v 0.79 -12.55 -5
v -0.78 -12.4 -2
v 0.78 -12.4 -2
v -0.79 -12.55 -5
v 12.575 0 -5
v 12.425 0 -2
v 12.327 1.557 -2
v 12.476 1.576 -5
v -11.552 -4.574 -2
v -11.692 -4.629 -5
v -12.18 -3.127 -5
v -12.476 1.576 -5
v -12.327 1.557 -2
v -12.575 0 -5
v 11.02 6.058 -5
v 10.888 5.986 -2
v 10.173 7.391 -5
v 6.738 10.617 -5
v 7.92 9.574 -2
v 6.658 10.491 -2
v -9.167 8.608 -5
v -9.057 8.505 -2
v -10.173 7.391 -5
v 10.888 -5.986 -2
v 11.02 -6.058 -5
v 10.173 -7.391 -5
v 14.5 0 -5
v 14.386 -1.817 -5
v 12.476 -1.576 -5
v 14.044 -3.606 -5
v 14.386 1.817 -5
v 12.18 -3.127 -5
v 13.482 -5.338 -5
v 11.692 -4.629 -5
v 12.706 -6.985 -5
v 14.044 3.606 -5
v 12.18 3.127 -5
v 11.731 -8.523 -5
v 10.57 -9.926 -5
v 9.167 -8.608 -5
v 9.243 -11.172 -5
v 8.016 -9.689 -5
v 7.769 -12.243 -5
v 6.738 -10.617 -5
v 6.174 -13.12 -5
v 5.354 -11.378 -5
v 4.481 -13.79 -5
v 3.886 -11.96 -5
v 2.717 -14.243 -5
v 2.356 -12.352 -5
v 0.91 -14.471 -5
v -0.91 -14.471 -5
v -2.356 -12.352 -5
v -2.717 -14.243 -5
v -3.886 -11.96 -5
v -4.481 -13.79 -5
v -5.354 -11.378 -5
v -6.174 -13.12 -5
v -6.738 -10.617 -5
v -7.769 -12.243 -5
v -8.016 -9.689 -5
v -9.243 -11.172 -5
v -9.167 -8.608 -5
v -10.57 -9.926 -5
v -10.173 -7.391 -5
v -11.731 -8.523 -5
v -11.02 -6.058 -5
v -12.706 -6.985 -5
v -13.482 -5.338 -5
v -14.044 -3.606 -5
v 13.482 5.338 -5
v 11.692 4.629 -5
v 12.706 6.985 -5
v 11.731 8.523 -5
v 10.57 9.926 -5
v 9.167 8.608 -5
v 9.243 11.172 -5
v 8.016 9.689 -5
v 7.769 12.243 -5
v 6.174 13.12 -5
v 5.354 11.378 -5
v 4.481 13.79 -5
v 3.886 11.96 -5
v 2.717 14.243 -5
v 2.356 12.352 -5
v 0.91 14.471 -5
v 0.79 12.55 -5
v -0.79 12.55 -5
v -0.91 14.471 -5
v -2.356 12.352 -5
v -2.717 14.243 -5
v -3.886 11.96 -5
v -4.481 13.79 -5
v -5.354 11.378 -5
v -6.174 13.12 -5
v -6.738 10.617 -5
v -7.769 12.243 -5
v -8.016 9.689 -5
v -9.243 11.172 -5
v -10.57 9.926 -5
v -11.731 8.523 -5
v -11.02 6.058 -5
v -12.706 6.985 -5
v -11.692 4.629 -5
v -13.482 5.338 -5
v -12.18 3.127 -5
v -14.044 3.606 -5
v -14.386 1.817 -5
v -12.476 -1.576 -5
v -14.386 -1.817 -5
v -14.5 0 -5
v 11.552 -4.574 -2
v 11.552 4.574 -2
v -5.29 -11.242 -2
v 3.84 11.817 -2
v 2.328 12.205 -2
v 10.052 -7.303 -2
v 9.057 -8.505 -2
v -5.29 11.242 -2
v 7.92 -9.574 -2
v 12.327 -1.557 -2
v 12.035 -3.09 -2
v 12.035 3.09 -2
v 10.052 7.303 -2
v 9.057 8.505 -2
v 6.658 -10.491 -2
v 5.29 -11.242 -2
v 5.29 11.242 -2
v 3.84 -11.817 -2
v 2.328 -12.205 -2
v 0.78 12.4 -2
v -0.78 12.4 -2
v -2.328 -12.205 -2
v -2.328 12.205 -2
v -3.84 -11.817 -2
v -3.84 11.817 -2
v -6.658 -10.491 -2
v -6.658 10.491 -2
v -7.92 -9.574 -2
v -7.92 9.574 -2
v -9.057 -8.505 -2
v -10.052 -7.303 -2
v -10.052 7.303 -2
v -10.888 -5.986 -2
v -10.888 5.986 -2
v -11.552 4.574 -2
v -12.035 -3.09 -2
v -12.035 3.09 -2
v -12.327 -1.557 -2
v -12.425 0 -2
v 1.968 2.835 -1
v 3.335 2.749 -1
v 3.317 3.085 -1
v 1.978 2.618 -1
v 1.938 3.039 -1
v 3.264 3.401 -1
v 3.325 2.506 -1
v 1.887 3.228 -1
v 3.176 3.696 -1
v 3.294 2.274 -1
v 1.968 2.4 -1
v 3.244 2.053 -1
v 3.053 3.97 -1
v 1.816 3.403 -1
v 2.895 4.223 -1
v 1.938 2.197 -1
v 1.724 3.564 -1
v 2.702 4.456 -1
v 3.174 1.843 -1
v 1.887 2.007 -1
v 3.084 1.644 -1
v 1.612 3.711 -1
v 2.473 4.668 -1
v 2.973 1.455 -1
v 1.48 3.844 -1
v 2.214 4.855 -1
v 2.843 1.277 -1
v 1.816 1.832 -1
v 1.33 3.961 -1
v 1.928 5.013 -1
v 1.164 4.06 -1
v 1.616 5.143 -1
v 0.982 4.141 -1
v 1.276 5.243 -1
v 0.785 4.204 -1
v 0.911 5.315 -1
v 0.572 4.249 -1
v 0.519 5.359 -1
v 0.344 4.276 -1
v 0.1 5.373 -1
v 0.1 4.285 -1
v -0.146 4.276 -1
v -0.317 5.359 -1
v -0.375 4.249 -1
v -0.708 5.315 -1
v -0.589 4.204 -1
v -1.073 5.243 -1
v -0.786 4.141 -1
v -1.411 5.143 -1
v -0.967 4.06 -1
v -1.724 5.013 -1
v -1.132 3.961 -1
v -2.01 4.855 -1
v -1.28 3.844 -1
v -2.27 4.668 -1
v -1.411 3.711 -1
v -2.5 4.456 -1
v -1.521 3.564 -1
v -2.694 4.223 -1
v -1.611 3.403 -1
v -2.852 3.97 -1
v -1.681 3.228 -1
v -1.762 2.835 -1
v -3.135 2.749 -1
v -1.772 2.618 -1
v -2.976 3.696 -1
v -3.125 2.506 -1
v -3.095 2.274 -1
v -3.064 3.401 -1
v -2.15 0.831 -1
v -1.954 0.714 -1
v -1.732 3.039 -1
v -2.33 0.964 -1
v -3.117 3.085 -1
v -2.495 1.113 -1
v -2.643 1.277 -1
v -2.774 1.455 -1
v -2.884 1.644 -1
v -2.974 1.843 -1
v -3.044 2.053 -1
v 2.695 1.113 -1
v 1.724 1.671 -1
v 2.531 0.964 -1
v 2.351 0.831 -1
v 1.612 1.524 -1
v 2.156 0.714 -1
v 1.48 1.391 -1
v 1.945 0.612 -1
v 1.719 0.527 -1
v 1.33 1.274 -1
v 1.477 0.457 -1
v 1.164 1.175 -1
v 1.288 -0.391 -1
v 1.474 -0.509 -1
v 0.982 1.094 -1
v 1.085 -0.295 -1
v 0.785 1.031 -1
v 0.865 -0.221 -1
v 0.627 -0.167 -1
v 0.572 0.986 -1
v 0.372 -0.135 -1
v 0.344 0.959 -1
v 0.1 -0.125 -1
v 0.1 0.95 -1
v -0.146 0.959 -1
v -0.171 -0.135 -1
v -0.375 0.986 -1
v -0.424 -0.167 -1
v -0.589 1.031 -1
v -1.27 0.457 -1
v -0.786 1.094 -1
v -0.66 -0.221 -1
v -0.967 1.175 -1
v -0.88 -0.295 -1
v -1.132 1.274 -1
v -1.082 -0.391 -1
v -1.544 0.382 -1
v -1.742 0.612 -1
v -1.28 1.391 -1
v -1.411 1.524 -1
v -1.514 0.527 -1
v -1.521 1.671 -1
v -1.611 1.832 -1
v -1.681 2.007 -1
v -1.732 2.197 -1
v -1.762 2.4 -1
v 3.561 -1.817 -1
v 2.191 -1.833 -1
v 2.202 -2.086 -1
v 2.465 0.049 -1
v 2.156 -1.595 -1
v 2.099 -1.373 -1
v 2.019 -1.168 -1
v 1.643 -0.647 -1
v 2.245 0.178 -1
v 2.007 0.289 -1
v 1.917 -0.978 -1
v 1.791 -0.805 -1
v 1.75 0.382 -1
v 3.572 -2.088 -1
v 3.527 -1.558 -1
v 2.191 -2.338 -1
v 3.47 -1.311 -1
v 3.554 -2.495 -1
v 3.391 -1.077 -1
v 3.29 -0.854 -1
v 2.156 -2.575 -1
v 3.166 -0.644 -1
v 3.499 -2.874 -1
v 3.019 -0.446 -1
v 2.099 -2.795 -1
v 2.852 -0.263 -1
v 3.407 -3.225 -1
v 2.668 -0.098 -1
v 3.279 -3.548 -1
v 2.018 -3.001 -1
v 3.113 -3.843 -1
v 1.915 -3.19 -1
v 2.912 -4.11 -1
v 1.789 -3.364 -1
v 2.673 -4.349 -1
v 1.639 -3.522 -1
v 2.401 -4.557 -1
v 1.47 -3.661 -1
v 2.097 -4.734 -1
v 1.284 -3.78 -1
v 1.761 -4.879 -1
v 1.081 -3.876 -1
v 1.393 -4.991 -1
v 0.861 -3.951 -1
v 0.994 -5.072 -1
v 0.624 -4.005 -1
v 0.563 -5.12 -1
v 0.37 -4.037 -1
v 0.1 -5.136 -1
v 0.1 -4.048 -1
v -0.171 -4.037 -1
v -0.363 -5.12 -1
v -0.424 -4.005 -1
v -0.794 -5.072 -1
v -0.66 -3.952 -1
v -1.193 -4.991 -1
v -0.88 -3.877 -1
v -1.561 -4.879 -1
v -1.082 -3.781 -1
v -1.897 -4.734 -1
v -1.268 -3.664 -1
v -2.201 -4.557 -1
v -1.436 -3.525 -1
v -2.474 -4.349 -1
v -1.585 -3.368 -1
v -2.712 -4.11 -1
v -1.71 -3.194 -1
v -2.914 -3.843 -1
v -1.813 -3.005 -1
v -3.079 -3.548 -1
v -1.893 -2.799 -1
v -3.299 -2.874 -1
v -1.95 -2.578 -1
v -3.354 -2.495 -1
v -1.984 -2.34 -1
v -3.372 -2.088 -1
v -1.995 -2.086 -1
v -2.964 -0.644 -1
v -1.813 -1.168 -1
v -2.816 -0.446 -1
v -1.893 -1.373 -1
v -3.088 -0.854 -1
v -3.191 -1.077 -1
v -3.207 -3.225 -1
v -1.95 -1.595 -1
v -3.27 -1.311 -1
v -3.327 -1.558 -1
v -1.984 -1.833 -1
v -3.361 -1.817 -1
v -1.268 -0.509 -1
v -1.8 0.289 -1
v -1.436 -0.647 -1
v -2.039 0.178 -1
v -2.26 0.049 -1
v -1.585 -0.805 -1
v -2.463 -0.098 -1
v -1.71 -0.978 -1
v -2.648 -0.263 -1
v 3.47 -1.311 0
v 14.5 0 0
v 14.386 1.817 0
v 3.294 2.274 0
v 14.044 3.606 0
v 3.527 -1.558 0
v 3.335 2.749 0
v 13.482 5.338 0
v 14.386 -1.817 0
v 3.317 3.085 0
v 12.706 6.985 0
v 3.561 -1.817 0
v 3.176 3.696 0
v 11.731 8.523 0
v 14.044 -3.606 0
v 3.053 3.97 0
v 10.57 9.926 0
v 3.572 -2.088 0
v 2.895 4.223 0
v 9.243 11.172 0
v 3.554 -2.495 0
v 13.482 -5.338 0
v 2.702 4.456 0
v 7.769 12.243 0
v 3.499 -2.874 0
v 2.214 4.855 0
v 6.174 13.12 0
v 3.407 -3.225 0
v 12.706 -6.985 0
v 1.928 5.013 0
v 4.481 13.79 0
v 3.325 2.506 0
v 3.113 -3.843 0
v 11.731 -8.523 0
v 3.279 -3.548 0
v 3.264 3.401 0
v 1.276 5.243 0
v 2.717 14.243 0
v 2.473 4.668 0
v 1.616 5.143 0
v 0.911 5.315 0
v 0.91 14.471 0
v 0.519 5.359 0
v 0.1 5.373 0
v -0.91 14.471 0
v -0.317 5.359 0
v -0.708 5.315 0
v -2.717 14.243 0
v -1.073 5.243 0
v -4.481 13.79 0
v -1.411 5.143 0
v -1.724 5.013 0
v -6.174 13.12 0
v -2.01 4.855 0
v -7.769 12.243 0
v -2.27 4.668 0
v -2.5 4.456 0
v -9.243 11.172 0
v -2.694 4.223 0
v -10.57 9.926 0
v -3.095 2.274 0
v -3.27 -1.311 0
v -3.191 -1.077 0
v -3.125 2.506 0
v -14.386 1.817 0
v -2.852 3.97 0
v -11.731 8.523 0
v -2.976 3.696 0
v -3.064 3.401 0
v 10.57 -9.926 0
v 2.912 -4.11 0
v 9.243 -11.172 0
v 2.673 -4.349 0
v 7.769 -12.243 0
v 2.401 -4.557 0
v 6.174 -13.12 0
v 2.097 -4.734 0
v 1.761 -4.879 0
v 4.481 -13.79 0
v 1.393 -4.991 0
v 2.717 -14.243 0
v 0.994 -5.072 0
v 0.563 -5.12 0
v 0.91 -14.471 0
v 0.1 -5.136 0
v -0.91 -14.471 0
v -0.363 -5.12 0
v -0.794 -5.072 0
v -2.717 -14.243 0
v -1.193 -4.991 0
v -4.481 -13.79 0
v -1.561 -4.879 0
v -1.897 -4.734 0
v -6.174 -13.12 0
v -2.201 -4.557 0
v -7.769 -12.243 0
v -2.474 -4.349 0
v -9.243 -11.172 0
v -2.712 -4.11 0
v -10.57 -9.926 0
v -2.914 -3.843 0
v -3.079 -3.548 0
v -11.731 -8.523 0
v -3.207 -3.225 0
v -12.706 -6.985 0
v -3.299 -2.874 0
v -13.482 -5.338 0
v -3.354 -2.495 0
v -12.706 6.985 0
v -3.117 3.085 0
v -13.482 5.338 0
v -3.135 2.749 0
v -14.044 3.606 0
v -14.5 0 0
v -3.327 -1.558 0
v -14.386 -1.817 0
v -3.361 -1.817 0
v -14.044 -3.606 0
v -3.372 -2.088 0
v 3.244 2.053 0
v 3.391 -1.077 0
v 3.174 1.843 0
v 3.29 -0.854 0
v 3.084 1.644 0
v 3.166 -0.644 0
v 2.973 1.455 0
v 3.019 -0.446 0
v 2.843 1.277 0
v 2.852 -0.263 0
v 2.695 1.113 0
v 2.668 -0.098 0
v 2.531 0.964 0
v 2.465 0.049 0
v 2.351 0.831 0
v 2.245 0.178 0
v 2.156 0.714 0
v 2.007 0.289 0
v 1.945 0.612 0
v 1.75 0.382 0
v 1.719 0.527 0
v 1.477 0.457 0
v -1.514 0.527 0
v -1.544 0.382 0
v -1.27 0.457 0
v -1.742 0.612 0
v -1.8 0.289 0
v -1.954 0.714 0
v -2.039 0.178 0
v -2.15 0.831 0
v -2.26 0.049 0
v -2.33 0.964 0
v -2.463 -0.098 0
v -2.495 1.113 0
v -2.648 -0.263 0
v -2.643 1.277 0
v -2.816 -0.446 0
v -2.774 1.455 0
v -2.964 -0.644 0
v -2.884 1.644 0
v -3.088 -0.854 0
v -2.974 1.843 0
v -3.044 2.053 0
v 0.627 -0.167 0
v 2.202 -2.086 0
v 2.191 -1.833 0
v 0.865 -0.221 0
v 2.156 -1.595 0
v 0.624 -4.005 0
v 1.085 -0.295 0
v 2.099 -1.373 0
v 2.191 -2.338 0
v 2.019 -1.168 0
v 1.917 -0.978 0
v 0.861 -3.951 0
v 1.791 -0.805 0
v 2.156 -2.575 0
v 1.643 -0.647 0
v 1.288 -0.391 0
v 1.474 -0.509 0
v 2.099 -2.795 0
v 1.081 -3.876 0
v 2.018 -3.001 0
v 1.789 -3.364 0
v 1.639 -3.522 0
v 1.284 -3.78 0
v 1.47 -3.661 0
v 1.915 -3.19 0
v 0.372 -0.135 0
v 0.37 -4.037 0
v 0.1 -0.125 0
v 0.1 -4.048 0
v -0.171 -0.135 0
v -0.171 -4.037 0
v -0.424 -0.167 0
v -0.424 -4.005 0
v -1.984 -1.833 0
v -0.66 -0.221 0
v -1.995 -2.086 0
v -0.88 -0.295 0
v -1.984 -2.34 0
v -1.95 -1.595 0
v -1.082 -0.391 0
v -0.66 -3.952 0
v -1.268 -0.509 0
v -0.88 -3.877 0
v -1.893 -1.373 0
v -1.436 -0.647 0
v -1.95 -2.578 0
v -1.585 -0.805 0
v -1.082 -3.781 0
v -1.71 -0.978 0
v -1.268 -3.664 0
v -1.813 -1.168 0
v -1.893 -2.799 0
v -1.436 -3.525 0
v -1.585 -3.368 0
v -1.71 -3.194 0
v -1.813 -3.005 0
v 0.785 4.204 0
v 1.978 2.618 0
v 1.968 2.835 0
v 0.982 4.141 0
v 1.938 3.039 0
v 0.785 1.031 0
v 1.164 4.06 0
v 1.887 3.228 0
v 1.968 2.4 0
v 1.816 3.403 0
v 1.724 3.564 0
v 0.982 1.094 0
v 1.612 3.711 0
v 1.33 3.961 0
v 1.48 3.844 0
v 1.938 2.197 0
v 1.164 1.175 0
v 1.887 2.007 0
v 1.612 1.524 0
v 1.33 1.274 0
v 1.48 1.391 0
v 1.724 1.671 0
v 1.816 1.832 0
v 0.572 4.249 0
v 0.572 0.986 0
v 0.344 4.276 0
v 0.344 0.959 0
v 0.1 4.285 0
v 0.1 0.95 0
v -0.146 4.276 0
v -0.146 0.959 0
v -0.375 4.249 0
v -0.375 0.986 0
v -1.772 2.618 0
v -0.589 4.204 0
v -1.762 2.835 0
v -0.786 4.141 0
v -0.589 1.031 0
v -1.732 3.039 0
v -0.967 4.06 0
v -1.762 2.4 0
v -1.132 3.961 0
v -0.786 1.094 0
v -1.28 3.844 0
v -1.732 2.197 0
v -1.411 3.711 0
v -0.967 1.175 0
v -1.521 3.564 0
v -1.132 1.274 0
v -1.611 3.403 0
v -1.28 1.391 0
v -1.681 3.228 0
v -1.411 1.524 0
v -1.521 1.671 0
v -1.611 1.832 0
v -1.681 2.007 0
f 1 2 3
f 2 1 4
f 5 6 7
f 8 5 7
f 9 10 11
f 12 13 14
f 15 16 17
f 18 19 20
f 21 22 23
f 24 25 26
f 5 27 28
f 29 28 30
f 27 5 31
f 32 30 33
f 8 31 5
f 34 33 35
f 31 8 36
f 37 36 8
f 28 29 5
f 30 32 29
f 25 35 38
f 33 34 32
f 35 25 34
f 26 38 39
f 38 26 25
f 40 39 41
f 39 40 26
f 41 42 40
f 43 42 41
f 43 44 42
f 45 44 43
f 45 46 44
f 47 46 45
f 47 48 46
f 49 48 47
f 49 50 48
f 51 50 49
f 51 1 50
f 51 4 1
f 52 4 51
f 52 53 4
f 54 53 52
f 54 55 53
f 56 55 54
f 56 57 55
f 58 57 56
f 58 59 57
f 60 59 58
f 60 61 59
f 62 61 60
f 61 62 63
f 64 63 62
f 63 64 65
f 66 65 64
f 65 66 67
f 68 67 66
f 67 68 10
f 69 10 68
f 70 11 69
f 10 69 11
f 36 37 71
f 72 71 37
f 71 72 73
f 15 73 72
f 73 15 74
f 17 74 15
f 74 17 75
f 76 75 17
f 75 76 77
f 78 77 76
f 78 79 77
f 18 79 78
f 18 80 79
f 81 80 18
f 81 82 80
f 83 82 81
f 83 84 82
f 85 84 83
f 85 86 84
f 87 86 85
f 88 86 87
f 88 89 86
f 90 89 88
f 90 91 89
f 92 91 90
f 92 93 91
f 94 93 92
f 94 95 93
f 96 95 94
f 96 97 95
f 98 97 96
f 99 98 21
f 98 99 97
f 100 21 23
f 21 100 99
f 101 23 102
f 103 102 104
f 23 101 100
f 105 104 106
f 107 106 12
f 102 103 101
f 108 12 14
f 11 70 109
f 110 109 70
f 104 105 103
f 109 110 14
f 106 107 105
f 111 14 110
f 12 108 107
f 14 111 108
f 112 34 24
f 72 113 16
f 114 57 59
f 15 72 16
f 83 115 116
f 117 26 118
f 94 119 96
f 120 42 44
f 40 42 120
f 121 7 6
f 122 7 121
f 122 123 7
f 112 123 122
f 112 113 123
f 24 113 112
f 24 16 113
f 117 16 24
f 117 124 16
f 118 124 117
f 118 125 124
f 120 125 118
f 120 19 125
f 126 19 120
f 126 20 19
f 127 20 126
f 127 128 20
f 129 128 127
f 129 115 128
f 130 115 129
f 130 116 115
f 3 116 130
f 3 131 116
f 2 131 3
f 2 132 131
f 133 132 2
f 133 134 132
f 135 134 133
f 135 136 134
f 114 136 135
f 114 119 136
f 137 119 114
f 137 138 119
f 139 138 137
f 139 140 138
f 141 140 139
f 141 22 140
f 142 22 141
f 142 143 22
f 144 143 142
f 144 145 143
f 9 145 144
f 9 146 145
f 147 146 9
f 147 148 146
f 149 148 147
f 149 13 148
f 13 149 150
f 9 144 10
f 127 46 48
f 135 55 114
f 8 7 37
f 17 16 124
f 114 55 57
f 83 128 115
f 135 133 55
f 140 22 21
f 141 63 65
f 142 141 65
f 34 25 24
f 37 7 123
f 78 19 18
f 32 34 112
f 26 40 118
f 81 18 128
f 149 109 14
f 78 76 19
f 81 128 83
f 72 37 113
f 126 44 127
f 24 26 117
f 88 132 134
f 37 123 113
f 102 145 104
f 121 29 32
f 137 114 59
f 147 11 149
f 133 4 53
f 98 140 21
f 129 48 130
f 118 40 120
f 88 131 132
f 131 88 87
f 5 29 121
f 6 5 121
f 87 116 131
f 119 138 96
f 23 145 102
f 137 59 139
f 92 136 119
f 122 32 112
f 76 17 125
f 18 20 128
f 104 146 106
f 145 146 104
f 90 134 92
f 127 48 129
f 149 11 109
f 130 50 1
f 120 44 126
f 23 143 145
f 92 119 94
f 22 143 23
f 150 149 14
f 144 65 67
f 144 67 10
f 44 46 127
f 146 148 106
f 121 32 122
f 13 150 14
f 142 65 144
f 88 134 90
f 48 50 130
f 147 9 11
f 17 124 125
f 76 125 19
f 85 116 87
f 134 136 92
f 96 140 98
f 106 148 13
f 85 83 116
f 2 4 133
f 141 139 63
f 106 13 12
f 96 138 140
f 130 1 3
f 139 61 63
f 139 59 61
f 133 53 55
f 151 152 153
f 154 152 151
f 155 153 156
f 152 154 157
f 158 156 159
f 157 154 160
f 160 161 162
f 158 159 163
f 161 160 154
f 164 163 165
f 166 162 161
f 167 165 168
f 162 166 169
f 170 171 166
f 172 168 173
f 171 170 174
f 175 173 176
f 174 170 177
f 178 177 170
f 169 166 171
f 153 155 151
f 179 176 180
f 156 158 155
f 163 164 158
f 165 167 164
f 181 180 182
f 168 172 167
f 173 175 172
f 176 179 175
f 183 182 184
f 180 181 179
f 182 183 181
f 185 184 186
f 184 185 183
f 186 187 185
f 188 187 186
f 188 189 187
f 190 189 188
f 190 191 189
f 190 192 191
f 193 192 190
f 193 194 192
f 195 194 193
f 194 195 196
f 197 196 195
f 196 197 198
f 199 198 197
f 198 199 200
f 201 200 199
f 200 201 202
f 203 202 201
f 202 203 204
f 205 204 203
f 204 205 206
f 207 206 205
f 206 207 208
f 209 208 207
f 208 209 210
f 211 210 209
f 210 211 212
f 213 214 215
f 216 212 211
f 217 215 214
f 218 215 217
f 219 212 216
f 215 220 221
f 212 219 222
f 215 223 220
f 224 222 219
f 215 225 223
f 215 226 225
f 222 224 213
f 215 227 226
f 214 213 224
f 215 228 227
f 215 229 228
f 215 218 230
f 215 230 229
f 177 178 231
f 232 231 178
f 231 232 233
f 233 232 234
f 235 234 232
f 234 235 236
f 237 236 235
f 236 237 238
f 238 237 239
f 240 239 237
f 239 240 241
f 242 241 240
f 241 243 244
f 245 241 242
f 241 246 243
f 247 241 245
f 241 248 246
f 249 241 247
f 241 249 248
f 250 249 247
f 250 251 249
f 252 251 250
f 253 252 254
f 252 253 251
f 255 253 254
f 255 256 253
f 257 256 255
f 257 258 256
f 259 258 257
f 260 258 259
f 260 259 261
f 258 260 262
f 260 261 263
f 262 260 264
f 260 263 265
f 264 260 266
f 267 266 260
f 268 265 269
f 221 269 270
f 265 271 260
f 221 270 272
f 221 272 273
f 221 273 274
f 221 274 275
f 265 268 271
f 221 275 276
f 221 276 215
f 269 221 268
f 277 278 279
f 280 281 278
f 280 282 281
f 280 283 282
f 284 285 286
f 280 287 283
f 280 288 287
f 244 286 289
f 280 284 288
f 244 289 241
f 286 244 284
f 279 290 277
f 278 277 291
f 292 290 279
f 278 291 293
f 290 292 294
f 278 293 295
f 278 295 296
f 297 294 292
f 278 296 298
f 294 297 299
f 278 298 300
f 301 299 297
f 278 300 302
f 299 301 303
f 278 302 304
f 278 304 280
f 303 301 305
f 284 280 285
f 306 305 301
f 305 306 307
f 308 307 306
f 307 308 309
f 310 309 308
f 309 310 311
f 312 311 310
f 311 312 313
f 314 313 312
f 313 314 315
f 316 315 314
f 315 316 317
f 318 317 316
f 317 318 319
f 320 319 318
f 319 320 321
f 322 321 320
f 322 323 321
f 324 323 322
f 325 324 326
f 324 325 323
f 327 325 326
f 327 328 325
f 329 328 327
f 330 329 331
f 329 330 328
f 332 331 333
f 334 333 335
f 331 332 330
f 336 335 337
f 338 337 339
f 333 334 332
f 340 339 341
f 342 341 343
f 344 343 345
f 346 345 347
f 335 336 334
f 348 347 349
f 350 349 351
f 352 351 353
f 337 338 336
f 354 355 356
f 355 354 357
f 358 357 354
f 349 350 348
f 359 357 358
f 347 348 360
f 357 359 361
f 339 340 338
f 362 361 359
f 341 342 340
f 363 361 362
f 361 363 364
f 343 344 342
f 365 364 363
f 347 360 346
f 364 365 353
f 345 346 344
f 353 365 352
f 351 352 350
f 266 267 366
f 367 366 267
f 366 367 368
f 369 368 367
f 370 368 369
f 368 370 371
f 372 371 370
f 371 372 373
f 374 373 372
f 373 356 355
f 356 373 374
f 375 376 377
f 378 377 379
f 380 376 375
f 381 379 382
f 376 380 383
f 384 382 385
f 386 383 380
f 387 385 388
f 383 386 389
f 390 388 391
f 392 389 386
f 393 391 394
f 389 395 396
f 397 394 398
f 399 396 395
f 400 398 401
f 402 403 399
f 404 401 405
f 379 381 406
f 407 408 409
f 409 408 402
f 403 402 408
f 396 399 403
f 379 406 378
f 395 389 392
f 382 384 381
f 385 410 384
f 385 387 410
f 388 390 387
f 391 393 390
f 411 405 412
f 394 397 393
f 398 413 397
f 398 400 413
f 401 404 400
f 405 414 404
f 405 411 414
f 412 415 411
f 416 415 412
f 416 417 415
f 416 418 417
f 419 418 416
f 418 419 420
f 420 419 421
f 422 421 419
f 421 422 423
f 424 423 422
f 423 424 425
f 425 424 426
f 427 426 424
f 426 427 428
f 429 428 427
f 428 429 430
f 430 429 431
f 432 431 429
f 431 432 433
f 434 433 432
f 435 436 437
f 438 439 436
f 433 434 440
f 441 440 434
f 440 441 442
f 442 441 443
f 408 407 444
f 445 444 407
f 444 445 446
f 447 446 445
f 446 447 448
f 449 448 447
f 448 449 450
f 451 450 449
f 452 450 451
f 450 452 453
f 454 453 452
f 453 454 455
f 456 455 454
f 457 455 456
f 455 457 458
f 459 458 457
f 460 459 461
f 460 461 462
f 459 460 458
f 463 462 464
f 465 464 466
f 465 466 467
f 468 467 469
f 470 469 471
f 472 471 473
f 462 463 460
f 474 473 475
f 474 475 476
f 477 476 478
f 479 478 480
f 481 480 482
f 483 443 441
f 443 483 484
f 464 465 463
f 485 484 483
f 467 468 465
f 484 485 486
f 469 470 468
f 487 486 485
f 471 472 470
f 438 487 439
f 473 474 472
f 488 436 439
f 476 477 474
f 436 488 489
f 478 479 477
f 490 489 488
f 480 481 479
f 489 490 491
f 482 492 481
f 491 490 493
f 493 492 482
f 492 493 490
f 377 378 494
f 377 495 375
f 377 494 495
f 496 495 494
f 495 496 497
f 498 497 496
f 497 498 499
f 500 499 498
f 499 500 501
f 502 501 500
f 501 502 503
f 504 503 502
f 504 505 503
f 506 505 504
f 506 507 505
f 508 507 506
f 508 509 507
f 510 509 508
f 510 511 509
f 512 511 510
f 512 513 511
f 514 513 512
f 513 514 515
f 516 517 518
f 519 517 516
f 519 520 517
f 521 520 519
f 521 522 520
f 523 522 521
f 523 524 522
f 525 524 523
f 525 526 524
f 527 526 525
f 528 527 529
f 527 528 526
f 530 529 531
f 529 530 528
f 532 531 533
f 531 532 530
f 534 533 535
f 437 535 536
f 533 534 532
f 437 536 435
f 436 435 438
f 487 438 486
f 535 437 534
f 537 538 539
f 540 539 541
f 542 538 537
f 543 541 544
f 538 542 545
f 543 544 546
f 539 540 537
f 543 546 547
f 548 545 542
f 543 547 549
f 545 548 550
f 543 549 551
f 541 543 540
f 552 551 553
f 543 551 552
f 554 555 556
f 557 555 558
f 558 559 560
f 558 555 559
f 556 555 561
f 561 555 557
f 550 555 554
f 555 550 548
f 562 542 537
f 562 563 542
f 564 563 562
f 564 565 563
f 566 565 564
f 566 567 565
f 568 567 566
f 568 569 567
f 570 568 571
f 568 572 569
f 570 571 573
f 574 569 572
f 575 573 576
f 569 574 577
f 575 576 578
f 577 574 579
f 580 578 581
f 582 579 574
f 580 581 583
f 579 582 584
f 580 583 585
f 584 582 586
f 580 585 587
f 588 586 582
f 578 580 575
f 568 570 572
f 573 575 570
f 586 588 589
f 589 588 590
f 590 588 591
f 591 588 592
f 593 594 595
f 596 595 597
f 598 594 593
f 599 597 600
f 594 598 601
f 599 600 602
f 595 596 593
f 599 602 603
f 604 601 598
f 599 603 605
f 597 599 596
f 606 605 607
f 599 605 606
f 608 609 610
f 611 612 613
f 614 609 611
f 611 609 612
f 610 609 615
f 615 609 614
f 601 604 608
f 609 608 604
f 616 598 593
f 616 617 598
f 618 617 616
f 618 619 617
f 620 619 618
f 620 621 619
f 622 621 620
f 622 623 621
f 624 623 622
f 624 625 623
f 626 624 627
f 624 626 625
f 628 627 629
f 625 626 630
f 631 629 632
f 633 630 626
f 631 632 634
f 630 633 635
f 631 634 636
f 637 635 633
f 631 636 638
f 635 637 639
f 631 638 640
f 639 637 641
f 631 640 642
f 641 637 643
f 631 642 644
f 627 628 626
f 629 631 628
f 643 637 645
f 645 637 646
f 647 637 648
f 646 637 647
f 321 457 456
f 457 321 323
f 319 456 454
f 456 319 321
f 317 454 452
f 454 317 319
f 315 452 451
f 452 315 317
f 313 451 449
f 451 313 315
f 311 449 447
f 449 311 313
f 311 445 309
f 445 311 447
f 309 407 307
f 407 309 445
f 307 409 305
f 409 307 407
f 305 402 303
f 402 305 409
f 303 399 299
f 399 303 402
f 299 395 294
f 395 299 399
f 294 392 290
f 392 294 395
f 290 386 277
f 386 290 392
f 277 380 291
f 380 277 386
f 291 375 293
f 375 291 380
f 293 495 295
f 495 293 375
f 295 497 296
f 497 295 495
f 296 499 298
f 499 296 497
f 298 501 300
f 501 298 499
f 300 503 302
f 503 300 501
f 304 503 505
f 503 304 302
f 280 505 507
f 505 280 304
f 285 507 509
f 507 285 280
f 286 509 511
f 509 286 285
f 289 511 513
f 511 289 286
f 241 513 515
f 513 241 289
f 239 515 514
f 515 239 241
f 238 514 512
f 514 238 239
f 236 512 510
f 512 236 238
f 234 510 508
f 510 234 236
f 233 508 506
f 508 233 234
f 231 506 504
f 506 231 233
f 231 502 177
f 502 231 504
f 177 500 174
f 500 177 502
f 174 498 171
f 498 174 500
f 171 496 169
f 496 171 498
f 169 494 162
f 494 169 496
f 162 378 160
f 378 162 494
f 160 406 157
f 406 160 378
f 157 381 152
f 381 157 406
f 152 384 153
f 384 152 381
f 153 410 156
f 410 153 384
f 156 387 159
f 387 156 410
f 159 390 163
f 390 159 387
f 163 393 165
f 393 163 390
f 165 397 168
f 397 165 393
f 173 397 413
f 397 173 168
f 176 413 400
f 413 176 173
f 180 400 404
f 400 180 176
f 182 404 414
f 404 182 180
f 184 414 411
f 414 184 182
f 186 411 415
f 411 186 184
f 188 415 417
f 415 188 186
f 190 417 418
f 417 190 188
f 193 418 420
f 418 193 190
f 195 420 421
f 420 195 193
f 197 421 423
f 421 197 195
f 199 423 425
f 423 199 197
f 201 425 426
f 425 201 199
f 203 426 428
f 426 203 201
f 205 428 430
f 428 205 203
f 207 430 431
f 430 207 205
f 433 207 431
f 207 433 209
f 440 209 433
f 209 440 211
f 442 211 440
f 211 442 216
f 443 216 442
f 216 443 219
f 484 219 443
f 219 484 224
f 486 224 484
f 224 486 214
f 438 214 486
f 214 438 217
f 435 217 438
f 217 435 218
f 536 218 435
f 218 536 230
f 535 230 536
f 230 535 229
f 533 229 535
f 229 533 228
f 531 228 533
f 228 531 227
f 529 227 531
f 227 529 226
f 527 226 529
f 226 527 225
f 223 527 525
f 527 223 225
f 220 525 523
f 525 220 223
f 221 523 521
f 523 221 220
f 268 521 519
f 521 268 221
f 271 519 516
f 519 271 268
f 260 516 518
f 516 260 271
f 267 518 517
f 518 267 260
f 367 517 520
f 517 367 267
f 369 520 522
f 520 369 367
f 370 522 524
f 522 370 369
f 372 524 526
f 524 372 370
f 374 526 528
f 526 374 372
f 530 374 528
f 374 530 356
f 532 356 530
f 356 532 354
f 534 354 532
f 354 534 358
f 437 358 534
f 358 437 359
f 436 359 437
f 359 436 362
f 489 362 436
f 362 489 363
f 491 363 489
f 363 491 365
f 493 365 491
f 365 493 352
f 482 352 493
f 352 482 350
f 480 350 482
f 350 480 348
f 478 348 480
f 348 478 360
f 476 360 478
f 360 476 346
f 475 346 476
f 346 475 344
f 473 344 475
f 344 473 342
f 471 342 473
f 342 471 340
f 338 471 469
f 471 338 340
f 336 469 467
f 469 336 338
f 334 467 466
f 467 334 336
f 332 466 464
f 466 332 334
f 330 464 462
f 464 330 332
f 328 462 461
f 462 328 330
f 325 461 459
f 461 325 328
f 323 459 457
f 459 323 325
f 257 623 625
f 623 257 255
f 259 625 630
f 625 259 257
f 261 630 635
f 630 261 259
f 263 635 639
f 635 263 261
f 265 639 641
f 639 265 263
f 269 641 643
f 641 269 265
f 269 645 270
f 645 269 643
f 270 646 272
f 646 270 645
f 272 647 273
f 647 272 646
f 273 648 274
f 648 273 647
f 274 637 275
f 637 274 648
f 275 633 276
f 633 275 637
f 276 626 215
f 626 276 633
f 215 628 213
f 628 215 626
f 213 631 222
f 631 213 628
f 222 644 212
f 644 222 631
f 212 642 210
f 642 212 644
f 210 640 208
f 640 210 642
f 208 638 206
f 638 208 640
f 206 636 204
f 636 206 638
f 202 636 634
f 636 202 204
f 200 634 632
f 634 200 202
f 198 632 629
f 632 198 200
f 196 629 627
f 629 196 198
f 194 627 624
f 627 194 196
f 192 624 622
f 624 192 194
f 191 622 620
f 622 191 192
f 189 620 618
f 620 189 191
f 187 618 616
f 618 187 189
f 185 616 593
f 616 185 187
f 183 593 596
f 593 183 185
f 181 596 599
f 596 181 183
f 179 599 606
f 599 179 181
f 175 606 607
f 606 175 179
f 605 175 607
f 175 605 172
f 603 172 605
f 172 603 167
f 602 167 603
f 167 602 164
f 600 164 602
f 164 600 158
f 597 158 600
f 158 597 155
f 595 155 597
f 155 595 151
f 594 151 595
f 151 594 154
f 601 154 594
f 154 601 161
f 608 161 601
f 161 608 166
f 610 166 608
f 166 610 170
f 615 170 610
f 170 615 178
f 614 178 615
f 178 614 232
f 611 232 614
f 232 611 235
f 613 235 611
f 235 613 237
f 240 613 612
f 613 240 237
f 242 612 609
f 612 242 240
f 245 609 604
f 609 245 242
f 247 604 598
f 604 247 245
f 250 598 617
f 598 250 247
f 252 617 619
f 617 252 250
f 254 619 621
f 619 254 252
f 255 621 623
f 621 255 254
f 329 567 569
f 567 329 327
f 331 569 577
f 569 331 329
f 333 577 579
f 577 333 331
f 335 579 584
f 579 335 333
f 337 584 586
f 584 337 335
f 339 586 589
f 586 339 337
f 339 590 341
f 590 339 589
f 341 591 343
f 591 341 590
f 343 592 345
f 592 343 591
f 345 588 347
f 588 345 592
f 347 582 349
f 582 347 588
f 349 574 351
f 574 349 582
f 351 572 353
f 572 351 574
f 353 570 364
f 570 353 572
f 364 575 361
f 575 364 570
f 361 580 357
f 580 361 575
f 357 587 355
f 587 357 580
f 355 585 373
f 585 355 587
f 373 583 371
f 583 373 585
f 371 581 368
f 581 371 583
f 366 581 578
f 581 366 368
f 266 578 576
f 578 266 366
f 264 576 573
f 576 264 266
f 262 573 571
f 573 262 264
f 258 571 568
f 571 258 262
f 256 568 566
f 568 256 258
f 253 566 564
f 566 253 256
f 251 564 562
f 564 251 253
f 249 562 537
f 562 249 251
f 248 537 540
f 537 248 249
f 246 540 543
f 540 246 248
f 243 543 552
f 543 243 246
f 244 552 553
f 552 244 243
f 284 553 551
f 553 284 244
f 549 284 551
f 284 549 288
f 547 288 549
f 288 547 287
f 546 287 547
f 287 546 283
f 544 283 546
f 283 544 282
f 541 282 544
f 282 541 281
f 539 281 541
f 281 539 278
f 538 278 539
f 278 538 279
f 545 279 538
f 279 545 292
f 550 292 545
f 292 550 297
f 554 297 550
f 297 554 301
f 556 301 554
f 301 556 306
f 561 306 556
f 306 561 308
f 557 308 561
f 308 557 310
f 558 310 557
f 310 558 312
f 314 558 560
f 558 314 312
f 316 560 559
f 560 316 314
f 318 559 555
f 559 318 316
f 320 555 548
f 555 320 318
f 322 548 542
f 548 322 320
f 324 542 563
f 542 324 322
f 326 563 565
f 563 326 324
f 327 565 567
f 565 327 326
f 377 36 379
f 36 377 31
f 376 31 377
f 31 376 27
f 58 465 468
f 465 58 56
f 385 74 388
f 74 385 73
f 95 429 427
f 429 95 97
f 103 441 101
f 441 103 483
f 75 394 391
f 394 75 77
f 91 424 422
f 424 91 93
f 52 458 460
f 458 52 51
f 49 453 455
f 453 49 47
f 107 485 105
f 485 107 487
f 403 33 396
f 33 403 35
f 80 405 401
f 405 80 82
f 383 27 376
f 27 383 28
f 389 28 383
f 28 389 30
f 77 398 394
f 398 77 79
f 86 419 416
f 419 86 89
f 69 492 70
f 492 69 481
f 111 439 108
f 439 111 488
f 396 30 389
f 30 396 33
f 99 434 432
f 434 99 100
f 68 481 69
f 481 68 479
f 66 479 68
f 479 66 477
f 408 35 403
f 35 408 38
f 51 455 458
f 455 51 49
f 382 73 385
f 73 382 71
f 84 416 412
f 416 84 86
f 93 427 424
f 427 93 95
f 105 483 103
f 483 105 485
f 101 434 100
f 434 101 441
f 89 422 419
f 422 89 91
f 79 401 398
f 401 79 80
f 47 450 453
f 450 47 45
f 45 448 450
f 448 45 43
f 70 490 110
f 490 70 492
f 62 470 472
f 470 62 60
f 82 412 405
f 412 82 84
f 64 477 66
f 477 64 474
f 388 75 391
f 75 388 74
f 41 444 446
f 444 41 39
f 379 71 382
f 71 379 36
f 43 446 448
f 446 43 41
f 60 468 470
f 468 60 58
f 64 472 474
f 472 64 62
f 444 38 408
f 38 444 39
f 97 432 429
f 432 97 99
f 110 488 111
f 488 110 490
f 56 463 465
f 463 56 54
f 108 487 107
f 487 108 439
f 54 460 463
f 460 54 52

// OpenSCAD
$fn = 50;

difference() {
	union() {
		translate(v = [0, 0, -5.0]) {
			cylinder(h = 5, r = 14.5);
		}
	}
	union() {
		#translate(v = [0, 0, -5.0]) {
			cylinder(h = 3, r1 = 12.575, r2 = 12.425);
		}
		translate(v = [0, 0, -1]) {
			linear_extrude(height = 1) {
				text(font = "Impact", halign = "center", size = 10, text = "8", valign = "center");
			}
		}
	}
}
